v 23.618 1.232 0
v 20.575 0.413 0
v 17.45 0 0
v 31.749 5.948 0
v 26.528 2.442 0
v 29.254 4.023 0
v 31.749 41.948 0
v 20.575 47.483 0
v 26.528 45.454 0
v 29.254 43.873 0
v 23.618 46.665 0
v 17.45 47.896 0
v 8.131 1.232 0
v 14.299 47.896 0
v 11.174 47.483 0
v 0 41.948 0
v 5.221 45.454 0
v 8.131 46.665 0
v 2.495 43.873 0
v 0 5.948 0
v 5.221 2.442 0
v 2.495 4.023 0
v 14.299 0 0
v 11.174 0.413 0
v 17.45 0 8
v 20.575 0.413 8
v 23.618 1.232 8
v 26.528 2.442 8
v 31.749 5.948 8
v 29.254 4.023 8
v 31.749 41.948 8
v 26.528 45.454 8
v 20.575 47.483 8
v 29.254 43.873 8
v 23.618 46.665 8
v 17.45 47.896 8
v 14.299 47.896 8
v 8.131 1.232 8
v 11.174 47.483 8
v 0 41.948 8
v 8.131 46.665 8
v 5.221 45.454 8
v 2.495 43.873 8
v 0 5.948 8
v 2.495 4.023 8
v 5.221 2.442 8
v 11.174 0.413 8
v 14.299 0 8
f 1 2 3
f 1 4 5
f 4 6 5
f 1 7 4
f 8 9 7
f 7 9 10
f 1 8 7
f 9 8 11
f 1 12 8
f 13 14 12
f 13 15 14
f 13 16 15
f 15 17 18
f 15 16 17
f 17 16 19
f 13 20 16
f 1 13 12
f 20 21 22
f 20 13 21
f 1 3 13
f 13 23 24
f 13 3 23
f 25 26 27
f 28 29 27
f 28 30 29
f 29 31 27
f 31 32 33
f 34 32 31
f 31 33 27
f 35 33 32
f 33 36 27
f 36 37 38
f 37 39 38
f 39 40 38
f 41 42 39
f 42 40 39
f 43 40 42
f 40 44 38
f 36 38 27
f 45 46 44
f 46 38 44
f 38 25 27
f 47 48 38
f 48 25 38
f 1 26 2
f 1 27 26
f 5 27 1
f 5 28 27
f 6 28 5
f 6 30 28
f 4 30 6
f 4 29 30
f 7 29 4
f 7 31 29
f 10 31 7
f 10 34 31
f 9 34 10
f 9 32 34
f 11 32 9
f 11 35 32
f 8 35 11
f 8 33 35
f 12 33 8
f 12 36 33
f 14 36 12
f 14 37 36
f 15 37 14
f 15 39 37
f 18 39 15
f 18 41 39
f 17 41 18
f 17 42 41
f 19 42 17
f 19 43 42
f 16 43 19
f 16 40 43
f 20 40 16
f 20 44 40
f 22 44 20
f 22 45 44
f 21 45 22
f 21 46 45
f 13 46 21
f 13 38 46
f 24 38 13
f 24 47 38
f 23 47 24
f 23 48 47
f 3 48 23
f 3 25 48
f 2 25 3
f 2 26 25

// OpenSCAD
$fn = 32;

// ----------------------------------------------------------------------
// Eccentric disc: double_d, 8 mm thick
// ----------------------------------------------------------------------

// --- parameters (mm) ---
profile_height = 8;       // extrusion height
profile_points = 24;      // points of the closed outline

profile = [[31.749, 41.948], [29.254, 43.873], [26.528, 45.454], [23.618, 46.665], [20.575, 47.483], [17.45, 47.896], [14.299, 47.896], [11.174, 47.483], [8.131, 46.665], [5.221, 45.454], [2.495, 43.873], [0, 41.948], [0, 5.948], [2.495, 4.023], [5.221, 2.442], [8.131, 1.232], [11.174, 0.413], [14.299, 0], [17.45, 0], [20.575, 0.413], [23.618, 1.232], [26.528, 2.442], [29.254, 4.023], [31.749, 5.948]];  // single closed polygon, 24 points, counter clockwise

// --- the one profile operation ---
linear_extrude(height = profile_height) polygon(points = profile);
